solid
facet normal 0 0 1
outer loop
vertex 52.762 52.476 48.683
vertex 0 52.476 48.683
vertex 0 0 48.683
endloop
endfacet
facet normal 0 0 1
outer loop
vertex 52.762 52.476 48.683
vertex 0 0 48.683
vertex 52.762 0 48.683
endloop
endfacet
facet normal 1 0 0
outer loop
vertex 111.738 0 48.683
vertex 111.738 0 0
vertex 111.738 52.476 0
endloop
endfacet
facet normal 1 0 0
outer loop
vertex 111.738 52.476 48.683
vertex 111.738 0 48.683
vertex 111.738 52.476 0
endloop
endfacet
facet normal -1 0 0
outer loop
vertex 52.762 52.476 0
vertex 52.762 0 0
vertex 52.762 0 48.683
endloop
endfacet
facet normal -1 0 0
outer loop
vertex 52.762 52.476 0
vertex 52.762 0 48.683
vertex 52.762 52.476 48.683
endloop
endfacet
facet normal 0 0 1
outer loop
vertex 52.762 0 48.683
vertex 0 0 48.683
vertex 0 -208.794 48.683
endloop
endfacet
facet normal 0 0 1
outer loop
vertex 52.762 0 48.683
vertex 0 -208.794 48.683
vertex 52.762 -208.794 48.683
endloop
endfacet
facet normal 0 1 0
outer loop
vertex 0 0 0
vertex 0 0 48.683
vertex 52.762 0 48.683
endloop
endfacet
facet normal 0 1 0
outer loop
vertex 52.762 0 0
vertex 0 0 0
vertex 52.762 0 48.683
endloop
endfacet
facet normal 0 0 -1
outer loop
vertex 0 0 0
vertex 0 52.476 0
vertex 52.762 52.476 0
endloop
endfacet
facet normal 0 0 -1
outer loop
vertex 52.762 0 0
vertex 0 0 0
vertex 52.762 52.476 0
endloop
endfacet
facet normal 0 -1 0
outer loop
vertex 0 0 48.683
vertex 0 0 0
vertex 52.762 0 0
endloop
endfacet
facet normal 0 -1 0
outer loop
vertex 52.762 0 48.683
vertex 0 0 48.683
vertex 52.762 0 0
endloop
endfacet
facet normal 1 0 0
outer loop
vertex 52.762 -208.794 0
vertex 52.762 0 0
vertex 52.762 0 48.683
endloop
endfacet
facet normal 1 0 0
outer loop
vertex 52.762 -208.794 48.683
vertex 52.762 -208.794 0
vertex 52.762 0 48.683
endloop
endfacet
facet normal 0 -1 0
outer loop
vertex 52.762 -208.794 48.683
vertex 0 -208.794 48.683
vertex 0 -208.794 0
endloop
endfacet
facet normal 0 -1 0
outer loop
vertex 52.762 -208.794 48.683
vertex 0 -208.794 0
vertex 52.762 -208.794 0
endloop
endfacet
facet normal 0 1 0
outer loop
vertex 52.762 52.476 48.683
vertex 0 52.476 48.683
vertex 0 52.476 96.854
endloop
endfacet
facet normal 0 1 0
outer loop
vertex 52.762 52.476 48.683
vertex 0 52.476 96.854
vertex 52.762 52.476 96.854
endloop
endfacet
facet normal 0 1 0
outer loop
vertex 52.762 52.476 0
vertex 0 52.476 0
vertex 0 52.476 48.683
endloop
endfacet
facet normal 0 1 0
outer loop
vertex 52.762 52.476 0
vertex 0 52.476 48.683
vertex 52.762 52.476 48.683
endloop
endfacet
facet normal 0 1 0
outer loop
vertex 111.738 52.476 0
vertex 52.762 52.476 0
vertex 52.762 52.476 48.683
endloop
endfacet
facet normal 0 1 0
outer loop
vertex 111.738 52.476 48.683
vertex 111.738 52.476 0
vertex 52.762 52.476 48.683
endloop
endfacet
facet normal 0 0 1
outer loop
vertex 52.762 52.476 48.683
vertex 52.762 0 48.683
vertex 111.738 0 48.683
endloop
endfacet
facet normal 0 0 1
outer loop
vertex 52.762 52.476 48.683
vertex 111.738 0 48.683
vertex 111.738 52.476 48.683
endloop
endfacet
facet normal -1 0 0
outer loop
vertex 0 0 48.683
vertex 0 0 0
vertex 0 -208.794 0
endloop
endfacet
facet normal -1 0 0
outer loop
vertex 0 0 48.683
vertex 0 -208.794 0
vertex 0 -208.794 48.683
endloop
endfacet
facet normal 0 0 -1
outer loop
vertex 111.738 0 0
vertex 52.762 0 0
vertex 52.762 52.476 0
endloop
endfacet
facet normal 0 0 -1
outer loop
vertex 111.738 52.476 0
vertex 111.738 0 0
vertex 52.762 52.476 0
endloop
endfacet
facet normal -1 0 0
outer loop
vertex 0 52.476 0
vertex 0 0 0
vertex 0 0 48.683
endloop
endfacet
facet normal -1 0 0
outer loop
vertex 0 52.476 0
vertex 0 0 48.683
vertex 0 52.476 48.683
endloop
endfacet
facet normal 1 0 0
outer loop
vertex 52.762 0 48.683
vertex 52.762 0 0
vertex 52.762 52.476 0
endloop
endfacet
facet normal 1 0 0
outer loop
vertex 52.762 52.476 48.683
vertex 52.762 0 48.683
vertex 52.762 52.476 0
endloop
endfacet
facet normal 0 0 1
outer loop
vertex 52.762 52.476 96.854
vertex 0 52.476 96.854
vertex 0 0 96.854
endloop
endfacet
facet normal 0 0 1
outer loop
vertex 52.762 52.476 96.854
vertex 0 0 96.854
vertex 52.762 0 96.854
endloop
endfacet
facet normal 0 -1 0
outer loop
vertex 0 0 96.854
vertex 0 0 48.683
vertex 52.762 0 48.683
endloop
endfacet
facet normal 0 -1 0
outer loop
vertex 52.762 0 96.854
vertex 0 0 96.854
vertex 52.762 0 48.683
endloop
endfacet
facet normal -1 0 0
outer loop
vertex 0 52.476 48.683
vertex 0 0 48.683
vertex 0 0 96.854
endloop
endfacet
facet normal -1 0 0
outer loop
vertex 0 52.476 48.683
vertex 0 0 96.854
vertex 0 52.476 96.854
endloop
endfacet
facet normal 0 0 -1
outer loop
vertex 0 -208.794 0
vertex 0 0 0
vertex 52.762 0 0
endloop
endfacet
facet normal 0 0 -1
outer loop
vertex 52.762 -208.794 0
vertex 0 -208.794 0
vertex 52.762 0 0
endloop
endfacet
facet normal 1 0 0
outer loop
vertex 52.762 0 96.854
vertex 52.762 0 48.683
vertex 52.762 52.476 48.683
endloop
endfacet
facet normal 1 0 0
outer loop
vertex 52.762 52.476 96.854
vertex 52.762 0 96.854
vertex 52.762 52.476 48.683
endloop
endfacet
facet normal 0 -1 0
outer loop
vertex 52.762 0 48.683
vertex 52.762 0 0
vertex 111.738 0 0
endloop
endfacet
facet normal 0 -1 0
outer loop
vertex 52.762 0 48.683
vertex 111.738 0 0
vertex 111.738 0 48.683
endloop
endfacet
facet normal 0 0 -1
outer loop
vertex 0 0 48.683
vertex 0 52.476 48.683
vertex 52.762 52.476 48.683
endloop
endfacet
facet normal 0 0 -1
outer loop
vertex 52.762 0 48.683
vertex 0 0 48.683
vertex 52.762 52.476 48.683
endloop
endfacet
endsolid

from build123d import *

# Parameters (mm, degrees)
F0_W     = 52.7621656656
F0_H     = 52.4755194783
F1_DEPTH = 48.6833434552
F2_DEPTH = 48.1709782034
F3_W     = 52.7621656656
F3_H     = 48.6833434552
F4_DEPTH = 208.7936643511
F5_DEPTH = 58.975668624


with BuildPart() as f1:
    # F0 (on Top) → F1 (new body)
    with BuildSketch(Plane.XY):
        with Locations((26.3810828328, 26.2377597392)):
            Rectangle(F0_W, F0_H)
    extrude(amount=F1_DEPTH)


with BuildPart() as f2:
    # F2 (new): a face of the model
    f2_faces = [f1.part.faces().sort_by_distance(p)[0] for p in [
        (26.3810828328, 26.2377597392, 48.6833434552),
    ]]
    extrude(f2_faces, amount=F2_DEPTH)


with BuildPart() as f4:
    # F3 (on face) → F4 (new body)
    with BuildSketch(Plane.XZ):
        with Locations((26.3810828328, 24.3416717276)):
            Rectangle(F3_W, F3_H)
    extrude(amount=F4_DEPTH)


with BuildPart() as f5:
    # F5 (new): a face of the model
    f5_faces = [f1.part.faces().sort_by_distance(p)[0] for p in [
        (52.7621656656, 26.2377597392, 24.3416717276),
    ]]
    extrude(f5_faces, amount=F5_DEPTH)


solid = Compound([f1.part, f2.part, f4.part, f5.part])
